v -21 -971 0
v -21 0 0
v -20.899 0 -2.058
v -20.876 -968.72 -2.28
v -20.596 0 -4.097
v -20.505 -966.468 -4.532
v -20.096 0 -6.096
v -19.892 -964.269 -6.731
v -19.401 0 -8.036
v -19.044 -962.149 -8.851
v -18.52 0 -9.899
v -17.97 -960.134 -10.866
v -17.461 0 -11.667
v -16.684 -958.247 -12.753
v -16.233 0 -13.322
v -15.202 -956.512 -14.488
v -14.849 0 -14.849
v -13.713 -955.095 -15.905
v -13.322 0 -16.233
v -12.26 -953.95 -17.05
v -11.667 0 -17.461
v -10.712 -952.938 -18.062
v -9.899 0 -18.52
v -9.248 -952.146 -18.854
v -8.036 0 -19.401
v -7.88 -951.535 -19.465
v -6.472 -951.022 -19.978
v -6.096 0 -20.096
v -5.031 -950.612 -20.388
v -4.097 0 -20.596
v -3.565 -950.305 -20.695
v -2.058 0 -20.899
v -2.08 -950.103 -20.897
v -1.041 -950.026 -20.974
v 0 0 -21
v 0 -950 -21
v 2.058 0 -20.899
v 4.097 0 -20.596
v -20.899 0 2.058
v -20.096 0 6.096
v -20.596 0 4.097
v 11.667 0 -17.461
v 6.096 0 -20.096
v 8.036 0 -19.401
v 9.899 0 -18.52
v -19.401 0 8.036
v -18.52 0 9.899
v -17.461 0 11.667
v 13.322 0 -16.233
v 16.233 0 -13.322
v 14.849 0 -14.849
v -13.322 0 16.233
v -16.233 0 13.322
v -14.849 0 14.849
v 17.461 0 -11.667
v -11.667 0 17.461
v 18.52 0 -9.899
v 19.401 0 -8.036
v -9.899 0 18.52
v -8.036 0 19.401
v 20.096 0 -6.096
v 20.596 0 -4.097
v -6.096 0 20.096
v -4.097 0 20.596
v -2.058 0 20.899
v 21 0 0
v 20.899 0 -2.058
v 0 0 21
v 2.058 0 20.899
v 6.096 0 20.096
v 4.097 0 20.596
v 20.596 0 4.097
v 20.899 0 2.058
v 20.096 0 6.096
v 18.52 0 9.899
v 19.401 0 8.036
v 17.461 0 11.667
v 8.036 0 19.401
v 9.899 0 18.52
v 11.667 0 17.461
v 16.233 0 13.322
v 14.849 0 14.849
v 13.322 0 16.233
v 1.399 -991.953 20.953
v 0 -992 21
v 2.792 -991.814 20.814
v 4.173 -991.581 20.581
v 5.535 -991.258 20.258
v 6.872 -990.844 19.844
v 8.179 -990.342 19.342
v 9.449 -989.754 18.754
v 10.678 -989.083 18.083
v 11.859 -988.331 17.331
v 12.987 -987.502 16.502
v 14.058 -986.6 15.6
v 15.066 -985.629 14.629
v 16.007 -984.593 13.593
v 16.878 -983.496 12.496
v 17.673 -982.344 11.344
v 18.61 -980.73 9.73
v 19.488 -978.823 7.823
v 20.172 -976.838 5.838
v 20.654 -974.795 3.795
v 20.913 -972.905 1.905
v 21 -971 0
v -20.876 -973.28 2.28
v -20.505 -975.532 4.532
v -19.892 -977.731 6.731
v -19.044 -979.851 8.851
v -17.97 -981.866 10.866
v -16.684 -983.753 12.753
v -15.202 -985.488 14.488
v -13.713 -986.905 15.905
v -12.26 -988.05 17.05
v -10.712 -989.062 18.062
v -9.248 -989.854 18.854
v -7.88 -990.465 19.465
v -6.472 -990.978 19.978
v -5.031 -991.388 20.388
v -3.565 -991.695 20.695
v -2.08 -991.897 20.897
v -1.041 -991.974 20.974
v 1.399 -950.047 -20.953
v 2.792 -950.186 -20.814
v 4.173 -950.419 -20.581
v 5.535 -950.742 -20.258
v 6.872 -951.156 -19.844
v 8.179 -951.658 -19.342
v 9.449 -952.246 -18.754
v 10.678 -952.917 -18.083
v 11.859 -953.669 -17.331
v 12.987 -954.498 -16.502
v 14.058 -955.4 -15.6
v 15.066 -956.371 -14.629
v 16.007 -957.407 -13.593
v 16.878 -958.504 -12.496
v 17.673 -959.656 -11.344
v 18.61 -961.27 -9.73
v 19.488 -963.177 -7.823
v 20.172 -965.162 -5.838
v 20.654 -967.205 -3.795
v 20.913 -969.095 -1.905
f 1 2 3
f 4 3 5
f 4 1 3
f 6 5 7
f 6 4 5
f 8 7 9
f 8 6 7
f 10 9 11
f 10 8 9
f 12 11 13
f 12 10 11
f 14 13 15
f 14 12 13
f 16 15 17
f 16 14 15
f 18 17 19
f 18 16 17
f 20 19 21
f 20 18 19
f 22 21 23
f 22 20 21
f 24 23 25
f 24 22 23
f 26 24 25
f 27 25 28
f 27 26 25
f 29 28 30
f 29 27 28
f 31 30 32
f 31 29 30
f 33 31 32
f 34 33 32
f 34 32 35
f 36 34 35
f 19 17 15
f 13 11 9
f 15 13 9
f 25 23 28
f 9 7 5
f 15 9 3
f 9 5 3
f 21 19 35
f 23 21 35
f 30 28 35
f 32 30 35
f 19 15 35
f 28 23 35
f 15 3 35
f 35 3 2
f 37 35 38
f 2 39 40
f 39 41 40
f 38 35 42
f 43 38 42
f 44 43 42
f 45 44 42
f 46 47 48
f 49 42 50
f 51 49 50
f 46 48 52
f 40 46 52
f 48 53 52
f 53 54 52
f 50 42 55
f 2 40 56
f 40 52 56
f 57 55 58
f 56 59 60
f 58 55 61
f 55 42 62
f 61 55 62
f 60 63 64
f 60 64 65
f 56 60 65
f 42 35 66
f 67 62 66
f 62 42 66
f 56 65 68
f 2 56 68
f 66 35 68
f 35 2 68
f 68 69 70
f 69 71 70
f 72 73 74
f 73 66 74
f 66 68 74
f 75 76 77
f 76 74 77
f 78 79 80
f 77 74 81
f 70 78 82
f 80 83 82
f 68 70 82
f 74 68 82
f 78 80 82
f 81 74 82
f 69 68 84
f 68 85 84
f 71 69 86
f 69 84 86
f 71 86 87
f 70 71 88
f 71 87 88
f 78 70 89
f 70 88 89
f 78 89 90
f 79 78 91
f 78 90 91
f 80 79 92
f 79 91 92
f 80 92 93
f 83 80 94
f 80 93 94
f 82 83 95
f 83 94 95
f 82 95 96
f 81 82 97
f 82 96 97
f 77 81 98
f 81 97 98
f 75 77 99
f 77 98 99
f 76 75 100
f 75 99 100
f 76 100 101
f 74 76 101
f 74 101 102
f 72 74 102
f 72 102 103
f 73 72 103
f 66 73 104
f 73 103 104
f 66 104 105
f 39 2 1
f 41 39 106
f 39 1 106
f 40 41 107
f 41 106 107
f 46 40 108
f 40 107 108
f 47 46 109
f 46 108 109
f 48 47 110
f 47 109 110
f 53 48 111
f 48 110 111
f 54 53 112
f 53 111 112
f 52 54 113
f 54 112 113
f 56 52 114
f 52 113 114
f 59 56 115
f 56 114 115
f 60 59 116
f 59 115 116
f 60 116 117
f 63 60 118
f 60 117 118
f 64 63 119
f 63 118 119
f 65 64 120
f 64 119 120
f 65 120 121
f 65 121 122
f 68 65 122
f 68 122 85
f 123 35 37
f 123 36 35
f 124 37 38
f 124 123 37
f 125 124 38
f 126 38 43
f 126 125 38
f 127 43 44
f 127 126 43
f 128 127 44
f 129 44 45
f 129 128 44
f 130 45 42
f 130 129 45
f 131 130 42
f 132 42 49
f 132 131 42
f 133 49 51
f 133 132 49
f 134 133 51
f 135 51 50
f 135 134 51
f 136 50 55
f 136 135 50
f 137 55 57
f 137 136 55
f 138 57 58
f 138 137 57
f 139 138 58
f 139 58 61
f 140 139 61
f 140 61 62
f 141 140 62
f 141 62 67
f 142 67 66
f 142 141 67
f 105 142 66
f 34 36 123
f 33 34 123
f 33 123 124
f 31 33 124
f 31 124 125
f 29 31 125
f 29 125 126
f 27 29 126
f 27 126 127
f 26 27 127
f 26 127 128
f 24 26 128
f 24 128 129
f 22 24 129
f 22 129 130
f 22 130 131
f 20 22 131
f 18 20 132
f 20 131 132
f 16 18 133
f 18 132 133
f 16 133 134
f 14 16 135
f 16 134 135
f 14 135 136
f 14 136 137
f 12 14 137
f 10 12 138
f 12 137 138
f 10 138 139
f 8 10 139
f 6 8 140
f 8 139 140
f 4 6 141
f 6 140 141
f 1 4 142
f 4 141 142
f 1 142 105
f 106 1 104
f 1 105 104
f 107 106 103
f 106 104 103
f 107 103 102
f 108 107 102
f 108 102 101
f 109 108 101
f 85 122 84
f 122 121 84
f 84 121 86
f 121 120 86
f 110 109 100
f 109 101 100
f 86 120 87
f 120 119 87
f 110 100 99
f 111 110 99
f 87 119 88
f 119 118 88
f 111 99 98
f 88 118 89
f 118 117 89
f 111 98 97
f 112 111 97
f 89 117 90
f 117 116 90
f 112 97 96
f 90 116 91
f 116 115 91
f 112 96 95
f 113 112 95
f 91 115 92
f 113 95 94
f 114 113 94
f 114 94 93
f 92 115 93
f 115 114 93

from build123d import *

# Parameters (mm, degrees)
F0_W     = 42
F0_H     = 42
F1_DEPTH = 992
F3_DEPTH = 100
F4_R     = 20.99999


# Not quite as in the source:
# - a fillet or chamfer is up to 0.001 mm smaller than in the source, because OpenCascade refuses the exact size


with BuildPart() as f1:
    # F0 (on Front) → F1 (new body)
    with BuildSketch(Plane.XZ):
        Rectangle(F0_W, F0_H)
    extrude(amount=F1_DEPTH)

    # F2 (on face) → F3 (cut)
    with BuildSketch(Plane.YZ.offset(21)):
        Polygon((-950, -21), (-992, 21), (-992, -21), align=None)
    extrude(amount=-F3_DEPTH, mode=Mode.SUBTRACT)

    # F4 (radius 21 in the source; OpenCascade refuses exactly that, so slightly less here)
    f4_edges = [f1.edges().sort_by_distance(p)[0] for p in [
        (-21, -496, 21),
        (-21, -475, -21),
        (21, -496, 21),
        (21, -475, -21),
    ]]
    fillet(f4_edges, radius=F4_R)


solid = f1.part
